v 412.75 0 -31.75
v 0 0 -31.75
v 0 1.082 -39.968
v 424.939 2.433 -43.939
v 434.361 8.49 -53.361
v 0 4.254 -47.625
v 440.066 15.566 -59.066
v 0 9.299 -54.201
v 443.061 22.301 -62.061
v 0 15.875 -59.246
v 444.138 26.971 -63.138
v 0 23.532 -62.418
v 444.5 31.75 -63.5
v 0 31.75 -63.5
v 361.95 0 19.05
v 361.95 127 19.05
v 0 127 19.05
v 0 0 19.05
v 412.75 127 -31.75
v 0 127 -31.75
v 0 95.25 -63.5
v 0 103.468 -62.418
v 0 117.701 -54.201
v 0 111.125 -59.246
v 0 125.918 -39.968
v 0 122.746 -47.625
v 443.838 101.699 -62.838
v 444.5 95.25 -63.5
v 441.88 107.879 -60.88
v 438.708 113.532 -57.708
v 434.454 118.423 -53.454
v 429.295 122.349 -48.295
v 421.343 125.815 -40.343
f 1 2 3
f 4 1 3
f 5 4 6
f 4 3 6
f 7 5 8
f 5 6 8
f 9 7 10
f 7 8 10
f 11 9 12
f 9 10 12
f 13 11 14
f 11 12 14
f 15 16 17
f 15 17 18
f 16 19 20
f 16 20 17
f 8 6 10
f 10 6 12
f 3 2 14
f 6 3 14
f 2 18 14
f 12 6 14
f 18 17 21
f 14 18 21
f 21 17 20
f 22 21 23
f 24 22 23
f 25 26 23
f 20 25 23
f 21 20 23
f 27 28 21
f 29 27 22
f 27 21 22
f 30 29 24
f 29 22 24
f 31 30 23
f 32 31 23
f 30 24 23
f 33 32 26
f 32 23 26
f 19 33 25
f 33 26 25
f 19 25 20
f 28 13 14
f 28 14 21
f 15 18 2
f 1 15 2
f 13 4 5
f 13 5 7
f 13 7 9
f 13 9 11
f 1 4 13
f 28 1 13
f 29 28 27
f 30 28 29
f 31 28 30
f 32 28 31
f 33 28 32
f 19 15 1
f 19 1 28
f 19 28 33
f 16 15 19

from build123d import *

# Parameters (mm, degrees)
BOSS_EXTRUDE1_DEPTH = 444.5
SKETCH2_W           = 344.402501539
SKETCH2_H           = 780.457540958
CUT_EXTRUDE1_DEPTH  = 59.371664787


with BuildPart() as part:
    # Sketch1 → Boss-Extrude1 (new body)
    with BuildSketch(Plane(origin=(0, 0, 0), x_dir=(0, 0, -1), z_dir=(1, 0, 0))):
        with BuildLine():
            Line((0, 0), (31.75, 0))
            ThreePointArc((31.75, 0), (54.200640303, 9.299359697), (63.5, 31.75))
            Line((63.5, 31.75), (63.5, 95.25))
            ThreePointArc((63.5, 95.25), (54.200640303, 117.700640303), (31.75, 127))
            Line((31.75, 127), (0, 127))
            Line((0, 127), (-19.05, 127))
            Line((-19.05, 127), (-19.05, 0))
            Line((-19.05, 0), (0, 0))
        make_face()
    extrude(amount=BOSS_EXTRUDE1_DEPTH)

    # Sketch2 → Cut-Extrude1 (cut, through all)
    with BuildSketch(Plane(origin=(190.5, 0, 190.5), x_dir=(0, 1, 0), z_dir=(0.707106781, 0, 0.707106781))):
        with Locations((32.995160032, -359.210244843)):
            Rectangle(SKETCH2_W, SKETCH2_H)
    extrude(amount=CUT_EXTRUDE1_DEPTH, mode=Mode.SUBTRACT)


solid = part.part
